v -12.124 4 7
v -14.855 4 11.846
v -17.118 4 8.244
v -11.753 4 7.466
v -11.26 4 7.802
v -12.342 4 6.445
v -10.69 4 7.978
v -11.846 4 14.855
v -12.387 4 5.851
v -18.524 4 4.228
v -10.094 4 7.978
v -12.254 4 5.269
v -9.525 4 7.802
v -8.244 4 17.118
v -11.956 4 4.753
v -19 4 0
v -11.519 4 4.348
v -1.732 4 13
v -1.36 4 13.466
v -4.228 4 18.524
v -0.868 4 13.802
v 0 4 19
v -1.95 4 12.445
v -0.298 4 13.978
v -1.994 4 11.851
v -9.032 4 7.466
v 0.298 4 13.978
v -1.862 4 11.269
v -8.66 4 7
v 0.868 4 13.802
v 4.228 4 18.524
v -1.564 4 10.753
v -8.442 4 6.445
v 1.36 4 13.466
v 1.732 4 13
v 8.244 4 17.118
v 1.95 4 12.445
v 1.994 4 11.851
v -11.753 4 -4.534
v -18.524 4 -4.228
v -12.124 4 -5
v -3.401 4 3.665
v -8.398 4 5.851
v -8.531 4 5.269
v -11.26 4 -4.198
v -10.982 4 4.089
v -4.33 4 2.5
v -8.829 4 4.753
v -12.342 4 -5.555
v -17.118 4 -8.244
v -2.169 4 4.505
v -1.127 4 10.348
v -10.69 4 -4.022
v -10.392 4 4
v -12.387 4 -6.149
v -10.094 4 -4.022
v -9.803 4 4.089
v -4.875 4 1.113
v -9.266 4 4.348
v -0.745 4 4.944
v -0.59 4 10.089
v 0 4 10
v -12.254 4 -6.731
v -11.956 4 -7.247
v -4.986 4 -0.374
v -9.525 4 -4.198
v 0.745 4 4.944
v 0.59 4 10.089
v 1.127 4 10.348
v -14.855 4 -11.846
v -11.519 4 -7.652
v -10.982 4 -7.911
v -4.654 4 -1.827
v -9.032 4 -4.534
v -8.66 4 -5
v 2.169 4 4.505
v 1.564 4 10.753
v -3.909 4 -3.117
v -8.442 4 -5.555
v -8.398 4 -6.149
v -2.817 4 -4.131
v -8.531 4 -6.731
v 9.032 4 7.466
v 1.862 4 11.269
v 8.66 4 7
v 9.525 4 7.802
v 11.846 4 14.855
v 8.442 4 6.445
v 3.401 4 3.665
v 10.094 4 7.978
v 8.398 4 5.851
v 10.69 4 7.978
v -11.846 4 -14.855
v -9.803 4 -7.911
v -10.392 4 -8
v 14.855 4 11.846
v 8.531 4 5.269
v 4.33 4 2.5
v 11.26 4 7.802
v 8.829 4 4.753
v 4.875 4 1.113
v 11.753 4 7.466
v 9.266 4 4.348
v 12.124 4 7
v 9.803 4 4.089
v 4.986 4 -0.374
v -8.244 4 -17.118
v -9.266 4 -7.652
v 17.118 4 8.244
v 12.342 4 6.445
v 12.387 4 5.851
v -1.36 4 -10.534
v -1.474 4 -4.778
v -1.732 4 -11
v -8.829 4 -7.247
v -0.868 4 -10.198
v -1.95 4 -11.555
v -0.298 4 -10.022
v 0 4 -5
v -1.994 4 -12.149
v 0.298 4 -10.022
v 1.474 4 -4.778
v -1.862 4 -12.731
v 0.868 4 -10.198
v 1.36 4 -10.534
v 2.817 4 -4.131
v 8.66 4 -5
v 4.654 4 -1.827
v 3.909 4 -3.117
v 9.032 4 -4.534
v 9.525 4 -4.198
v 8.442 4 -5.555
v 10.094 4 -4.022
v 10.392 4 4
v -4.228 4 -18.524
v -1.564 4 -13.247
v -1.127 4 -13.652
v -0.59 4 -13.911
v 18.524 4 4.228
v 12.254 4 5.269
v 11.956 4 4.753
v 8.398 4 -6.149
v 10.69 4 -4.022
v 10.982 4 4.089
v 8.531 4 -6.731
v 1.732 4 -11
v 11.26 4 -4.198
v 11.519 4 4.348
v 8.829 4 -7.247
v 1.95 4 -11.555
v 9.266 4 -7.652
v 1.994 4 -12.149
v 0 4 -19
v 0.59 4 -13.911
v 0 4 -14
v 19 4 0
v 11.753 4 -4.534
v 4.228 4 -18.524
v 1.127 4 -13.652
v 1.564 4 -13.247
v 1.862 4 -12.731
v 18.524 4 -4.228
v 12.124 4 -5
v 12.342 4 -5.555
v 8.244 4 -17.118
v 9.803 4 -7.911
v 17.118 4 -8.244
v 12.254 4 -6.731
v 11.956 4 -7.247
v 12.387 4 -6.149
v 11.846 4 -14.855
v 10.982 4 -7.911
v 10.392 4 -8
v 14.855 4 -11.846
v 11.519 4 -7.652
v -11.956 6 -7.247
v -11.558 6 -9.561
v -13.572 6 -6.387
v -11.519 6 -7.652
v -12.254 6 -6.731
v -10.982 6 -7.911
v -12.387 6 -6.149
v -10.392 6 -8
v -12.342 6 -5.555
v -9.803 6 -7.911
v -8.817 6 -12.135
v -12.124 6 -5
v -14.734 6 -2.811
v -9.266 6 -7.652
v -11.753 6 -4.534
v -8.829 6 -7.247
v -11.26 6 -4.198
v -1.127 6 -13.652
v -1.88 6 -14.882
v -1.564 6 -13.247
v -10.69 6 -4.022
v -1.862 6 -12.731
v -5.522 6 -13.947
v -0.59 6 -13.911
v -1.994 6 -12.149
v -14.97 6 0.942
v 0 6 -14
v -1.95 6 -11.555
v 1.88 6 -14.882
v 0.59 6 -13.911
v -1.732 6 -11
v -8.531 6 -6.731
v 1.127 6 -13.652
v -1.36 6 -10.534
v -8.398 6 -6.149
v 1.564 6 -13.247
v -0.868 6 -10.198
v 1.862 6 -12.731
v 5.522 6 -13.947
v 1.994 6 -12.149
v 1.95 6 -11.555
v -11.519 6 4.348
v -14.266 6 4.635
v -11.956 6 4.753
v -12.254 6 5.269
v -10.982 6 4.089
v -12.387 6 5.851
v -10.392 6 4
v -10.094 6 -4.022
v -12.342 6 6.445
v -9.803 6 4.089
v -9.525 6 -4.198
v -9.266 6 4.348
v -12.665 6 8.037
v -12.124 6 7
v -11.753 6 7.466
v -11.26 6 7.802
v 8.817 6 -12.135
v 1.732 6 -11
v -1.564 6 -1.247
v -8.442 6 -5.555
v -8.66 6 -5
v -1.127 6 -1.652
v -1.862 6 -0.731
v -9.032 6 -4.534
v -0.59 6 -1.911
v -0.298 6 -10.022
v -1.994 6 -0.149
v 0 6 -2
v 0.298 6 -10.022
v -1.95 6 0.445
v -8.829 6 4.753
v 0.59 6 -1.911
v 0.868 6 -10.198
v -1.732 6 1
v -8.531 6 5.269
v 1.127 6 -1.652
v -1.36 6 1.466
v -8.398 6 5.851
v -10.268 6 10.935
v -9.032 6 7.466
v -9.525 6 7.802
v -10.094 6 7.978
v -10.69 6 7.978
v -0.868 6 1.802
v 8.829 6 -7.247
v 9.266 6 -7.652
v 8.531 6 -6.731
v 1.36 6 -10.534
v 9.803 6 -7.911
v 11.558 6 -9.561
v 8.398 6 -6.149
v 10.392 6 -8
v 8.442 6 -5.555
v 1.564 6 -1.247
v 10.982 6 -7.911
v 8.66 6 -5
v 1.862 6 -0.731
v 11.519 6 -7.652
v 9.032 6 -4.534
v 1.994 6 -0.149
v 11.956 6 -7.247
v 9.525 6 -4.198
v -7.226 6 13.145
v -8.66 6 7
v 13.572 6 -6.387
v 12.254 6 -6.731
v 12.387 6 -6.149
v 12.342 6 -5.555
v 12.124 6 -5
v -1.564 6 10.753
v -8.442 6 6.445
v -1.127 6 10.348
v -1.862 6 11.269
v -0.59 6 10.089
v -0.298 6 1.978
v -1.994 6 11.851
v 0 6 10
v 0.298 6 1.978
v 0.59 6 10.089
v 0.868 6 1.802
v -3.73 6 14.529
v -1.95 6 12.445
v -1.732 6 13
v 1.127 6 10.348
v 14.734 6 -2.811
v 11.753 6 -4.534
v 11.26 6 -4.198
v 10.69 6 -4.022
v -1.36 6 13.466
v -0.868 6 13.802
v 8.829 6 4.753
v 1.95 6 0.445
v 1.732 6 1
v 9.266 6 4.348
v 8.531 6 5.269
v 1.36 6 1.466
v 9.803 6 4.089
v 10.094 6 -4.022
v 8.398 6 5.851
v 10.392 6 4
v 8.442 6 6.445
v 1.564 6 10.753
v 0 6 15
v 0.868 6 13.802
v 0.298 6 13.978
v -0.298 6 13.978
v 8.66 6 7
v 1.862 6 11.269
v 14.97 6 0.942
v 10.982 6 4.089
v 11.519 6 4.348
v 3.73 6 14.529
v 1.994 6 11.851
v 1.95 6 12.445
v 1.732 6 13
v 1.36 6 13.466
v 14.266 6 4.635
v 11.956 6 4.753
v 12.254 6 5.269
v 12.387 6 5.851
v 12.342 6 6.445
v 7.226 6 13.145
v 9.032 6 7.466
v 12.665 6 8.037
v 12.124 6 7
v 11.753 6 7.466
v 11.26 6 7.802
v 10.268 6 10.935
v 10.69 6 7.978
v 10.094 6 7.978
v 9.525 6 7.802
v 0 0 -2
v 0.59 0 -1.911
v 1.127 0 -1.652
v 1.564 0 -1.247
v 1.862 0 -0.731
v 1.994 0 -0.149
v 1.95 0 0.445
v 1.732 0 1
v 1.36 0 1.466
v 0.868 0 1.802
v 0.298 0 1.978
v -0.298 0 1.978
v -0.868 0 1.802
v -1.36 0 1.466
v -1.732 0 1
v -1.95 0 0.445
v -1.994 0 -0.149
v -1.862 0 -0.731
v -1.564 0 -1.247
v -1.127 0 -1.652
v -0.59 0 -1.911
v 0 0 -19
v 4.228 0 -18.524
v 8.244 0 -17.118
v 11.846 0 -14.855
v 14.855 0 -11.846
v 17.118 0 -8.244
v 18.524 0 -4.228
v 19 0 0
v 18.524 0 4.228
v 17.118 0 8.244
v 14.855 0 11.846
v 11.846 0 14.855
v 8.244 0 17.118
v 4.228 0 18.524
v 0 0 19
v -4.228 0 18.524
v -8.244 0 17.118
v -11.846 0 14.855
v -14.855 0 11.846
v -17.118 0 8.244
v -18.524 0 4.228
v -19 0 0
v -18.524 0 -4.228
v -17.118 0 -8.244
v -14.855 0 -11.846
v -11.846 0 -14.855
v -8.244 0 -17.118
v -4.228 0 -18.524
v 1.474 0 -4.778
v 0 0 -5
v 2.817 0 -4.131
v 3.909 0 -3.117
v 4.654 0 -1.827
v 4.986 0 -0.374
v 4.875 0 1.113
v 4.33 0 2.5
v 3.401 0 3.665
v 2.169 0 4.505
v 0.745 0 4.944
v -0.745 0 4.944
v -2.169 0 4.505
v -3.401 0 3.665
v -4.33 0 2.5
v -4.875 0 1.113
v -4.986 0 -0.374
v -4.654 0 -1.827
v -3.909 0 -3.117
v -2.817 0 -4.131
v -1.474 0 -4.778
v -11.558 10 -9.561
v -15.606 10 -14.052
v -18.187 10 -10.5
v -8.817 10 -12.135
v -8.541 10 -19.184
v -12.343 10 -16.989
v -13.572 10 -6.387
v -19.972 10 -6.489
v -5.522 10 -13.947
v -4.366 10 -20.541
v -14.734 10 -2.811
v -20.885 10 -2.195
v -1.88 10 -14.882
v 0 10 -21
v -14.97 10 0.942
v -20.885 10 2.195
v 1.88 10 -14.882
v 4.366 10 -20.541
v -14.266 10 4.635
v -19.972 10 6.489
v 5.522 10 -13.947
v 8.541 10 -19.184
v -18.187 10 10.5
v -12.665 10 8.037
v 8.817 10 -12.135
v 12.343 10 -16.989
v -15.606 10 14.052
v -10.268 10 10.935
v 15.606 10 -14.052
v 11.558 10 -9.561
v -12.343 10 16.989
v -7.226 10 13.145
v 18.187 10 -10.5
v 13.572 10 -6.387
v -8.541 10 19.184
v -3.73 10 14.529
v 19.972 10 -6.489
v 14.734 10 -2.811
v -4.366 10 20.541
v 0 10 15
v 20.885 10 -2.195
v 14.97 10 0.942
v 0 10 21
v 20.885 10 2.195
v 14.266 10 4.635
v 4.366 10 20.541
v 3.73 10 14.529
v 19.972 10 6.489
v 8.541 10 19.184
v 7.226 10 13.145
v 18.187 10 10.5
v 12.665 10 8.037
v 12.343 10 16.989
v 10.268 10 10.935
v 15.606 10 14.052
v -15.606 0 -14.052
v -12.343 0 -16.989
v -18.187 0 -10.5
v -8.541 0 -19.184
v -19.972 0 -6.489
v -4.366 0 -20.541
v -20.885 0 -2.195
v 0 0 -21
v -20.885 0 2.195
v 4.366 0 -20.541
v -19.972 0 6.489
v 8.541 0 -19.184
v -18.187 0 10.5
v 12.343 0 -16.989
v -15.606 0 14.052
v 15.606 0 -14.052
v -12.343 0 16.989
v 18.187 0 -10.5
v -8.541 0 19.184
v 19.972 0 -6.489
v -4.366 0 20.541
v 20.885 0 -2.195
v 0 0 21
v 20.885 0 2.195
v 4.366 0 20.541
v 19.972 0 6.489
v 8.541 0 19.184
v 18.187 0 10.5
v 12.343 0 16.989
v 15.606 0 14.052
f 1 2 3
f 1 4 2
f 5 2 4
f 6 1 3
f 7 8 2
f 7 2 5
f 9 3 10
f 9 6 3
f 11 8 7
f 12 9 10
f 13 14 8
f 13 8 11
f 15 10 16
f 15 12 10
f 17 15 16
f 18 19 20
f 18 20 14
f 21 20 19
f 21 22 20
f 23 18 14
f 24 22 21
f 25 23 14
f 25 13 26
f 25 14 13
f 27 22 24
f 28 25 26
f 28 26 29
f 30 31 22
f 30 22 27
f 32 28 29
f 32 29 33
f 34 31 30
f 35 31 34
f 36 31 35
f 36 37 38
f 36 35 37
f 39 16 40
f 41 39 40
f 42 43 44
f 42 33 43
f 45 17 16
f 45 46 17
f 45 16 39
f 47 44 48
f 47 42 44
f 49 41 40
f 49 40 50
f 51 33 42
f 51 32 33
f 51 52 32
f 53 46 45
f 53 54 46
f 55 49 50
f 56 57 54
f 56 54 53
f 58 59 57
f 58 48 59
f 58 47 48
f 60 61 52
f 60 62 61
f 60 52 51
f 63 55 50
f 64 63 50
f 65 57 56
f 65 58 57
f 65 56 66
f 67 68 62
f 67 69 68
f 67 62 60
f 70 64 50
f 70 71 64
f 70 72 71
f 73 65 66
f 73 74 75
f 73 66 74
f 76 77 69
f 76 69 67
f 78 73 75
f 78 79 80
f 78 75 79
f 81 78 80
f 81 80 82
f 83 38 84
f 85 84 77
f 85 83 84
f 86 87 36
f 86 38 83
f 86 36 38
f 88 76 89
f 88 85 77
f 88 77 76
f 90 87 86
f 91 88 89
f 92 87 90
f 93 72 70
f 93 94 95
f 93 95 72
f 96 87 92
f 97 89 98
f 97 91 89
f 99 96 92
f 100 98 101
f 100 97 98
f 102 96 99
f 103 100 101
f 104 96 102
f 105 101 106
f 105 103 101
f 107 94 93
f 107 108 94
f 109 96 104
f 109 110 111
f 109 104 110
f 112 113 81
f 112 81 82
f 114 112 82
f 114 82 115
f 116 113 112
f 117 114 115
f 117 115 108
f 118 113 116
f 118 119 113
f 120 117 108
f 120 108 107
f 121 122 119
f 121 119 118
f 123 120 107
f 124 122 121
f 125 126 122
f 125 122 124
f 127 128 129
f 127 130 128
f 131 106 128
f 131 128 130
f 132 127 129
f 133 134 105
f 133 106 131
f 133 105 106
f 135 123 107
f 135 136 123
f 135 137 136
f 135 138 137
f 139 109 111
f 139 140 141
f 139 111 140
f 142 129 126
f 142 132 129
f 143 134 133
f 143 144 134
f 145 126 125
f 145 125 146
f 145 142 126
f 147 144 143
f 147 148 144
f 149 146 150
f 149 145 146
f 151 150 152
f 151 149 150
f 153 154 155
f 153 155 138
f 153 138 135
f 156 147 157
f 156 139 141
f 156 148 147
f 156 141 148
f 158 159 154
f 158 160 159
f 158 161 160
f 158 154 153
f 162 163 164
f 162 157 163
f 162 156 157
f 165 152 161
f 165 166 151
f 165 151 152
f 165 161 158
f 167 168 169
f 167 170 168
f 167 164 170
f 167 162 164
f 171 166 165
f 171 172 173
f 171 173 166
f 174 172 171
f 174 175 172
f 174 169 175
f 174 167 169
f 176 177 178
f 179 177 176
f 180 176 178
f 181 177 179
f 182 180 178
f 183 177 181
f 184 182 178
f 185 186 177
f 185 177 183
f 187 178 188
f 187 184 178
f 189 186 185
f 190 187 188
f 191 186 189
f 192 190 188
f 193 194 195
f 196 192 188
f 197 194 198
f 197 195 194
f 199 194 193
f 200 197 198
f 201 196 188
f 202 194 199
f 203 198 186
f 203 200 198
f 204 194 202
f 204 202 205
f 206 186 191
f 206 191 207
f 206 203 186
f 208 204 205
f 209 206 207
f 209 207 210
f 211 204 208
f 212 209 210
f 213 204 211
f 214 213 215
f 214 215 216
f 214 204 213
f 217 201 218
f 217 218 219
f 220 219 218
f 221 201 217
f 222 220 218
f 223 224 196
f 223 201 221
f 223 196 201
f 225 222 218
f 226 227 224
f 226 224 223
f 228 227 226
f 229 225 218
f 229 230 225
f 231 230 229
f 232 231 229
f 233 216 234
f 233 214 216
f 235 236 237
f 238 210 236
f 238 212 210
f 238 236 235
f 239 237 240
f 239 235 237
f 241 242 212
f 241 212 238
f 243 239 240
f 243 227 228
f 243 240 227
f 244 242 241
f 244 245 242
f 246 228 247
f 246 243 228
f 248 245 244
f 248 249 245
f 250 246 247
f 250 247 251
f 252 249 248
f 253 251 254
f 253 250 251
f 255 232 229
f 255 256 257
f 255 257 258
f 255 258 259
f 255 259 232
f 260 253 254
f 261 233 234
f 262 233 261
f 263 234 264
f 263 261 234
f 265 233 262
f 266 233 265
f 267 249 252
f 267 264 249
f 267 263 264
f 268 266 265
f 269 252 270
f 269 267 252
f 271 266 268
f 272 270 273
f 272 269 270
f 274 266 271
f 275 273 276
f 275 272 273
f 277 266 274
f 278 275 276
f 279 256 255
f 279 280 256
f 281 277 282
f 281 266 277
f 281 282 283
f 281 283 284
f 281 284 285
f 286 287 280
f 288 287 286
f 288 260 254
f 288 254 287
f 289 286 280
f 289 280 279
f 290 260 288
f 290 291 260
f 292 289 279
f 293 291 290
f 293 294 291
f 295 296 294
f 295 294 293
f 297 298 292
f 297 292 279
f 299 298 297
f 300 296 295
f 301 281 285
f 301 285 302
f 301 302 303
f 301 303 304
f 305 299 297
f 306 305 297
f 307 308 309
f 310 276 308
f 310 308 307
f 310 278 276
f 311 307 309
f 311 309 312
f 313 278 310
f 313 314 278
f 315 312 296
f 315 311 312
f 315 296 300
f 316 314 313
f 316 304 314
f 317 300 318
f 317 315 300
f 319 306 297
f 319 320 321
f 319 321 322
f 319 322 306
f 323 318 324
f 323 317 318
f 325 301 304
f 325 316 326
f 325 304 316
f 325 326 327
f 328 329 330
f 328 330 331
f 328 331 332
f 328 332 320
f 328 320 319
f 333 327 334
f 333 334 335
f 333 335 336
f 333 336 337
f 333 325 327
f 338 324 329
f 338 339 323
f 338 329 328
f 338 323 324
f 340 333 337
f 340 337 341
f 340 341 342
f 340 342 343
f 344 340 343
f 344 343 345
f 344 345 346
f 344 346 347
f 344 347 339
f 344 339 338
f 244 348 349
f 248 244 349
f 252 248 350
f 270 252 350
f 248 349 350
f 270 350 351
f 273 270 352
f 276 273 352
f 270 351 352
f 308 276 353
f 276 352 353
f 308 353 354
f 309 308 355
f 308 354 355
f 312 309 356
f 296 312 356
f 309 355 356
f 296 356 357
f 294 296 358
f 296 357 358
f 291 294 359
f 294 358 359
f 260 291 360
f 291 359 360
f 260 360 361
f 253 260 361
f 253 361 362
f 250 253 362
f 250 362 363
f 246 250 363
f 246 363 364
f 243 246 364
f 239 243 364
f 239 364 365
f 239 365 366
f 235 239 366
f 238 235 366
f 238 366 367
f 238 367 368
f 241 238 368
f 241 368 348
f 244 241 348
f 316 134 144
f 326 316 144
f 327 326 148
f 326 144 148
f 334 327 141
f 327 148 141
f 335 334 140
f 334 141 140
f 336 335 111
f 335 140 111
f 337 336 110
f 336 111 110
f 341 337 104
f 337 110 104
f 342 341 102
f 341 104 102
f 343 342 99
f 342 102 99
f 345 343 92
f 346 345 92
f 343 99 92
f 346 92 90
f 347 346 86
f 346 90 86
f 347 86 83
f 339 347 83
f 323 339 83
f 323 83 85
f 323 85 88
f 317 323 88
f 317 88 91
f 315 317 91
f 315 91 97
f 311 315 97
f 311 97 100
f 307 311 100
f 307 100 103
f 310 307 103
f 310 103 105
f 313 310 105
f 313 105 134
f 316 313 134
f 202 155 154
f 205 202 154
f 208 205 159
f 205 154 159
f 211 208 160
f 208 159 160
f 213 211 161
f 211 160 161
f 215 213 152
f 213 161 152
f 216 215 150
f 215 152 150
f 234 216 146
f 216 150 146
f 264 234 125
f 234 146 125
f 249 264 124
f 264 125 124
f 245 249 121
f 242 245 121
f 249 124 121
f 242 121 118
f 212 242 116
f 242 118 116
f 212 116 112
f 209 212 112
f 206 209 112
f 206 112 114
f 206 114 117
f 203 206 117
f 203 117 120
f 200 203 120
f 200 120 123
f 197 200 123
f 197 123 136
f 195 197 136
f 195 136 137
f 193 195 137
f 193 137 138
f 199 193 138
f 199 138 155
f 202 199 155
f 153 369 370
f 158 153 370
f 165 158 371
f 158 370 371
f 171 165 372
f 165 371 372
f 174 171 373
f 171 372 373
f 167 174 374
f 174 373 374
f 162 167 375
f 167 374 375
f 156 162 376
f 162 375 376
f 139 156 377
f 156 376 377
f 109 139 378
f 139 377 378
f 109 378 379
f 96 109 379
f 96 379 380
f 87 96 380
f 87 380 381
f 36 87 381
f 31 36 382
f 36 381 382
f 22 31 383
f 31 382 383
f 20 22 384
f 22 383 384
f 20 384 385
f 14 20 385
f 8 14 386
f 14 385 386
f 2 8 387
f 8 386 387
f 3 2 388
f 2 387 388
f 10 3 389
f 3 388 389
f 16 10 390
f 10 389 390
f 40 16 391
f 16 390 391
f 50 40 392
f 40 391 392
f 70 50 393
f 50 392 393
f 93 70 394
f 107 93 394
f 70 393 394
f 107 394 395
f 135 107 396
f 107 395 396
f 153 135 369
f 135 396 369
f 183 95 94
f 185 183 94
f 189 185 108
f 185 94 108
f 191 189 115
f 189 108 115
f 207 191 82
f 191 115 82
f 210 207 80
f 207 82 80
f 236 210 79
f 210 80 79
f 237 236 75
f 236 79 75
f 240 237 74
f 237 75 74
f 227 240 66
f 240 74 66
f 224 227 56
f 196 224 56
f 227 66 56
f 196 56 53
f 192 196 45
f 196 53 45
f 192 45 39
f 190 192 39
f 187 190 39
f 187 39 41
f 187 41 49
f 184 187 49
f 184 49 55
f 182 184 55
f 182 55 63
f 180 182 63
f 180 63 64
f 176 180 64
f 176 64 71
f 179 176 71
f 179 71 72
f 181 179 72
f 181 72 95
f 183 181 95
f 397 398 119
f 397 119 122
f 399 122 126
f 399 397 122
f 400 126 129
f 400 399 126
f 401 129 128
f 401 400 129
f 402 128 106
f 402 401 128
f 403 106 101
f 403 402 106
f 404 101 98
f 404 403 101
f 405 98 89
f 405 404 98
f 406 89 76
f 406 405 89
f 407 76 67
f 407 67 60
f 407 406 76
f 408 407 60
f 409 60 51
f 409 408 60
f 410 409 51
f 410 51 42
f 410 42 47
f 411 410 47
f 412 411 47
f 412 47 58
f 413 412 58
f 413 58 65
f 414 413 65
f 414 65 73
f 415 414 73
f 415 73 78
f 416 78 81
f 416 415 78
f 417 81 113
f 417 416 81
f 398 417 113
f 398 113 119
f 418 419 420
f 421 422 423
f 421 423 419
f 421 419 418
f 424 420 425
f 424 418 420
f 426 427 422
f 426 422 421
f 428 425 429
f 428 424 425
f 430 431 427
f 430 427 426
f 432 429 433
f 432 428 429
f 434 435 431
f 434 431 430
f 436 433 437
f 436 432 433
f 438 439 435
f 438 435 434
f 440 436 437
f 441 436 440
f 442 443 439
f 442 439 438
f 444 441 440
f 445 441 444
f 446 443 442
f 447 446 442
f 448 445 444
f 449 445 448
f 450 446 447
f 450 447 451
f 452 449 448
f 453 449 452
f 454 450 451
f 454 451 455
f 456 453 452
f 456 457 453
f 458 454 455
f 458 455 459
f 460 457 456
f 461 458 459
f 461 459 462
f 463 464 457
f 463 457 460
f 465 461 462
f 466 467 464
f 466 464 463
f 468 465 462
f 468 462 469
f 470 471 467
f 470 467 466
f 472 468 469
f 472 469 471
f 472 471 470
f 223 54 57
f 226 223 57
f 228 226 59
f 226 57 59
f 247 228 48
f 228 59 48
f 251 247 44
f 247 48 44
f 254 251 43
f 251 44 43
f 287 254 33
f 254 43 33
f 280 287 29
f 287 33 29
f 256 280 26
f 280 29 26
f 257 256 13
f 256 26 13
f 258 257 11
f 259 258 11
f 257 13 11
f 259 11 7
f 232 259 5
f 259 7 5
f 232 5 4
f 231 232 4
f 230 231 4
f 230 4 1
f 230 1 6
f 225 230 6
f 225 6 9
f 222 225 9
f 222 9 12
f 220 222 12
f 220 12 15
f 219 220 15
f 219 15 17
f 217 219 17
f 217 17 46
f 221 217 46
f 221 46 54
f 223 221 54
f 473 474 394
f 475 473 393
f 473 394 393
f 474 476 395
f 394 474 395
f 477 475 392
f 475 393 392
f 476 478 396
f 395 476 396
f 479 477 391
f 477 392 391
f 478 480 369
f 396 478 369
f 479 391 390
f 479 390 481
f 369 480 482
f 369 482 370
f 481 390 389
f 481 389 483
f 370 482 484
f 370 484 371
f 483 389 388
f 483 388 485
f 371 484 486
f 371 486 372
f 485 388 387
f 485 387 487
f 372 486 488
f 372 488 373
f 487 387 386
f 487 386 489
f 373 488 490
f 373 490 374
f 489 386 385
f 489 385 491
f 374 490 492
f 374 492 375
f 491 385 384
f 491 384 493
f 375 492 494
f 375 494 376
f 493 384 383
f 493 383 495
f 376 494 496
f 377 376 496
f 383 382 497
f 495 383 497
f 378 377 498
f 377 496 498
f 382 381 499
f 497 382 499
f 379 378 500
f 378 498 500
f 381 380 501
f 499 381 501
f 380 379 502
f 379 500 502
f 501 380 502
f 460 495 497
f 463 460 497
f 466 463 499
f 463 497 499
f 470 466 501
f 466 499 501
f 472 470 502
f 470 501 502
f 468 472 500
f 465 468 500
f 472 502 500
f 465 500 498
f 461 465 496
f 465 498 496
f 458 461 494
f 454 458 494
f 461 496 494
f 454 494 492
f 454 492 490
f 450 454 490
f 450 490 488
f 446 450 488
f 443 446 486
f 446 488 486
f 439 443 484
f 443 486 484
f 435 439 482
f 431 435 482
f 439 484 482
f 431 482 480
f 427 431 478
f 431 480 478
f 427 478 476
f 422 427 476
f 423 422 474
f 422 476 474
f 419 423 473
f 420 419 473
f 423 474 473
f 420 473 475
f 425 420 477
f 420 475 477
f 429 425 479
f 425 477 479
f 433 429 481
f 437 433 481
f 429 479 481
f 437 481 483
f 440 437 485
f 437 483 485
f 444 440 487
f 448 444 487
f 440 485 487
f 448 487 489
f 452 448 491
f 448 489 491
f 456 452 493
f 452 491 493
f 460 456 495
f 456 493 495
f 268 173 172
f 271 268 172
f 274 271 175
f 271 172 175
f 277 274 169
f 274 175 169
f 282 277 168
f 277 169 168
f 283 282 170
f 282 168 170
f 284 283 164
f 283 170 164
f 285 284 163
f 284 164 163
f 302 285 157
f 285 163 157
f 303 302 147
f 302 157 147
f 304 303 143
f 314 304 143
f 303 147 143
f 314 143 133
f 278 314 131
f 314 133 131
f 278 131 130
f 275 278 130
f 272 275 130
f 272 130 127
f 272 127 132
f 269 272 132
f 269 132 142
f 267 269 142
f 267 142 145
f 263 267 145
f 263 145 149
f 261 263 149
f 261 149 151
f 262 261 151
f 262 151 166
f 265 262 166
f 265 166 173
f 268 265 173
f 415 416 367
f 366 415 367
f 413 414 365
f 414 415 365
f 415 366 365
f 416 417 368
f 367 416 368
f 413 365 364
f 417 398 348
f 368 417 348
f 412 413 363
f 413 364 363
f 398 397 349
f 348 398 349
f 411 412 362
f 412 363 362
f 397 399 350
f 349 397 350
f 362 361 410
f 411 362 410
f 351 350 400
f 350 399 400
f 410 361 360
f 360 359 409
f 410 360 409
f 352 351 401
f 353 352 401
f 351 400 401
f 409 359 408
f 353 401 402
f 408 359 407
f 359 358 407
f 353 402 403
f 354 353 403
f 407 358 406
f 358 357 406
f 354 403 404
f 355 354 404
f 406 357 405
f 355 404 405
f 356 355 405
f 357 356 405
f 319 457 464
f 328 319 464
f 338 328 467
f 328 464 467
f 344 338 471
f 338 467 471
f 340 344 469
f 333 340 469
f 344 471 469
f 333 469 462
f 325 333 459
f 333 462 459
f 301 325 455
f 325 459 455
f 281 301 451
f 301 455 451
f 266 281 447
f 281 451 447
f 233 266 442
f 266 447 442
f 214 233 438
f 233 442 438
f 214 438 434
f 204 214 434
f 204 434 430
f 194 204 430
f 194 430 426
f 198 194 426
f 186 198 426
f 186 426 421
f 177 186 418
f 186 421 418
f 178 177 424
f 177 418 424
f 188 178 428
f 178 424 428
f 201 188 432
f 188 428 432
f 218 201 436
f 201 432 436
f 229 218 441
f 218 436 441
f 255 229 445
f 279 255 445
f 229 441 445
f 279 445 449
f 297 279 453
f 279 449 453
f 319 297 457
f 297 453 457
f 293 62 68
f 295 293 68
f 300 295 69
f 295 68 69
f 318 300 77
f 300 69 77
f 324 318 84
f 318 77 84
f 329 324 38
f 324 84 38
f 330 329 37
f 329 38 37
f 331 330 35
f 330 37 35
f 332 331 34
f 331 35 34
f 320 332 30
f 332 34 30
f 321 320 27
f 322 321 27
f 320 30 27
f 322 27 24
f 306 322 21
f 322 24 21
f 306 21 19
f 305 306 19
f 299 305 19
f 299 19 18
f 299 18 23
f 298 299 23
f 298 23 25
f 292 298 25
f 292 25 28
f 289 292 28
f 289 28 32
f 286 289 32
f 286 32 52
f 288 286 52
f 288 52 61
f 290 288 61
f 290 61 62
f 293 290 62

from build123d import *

# Parameters (mm, degrees)
SKETCH1_R           = 21
BOSS_EXTRUDE1_DEPTH = 10
SKETCH2_R           = 15
CUT_EXTRUDE1_DEPTH  = 4
SKETCH3_R           = 19
SKETCH3_R_2         = 5
CUT_EXTRUDE2_DEPTH  = 4
SKETCH4_R           = 2
CUT_EXTRUDE3_DEPTH  = 32.336879232
SKETCH5_R           = 2
CUT_EXTRUDE4_DEPTH  = 31.298514815


with BuildPart() as part:
    # Sketch1 → Boss-Extrude1 (new body)
    with BuildSketch(Plane(origin=(0, 0, 0), x_dir=(1, 0, 0), z_dir=(0, 1, 0))):
        with Locations(Location((0, 0, 0), (0, 0, 270))):
            Circle(SKETCH1_R)
    extrude(amount=BOSS_EXTRUDE1_DEPTH)

    # Sketch2 → Cut-Extrude1 (cut)
    with BuildSketch(Plane(origin=(0, 10, 0), x_dir=(1, 0, 0), z_dir=(0, 1, 0))):
        with Locations(Location((0, 0, 0), (0, 0, 270))):
            Circle(SKETCH2_R)
    extrude(amount=-CUT_EXTRUDE1_DEPTH, mode=Mode.SUBTRACT)

    # Sketch3 → Cut-Extrude2 (cut)
    with BuildSketch(Plane.XZ):
        with Locations(Location((0, 0, 0), (0, 0, 270))):
            Circle(SKETCH3_R)
        with Locations(Location((0, 0, 0), (0, 0, 270))):
            Circle(SKETCH3_R_2, mode=Mode.SUBTRACT)
    extrude(amount=-CUT_EXTRUDE2_DEPTH, mode=Mode.SUBTRACT)

    # Sketch4 → Cut-Extrude3 (cut, through all)
    with BuildSketch(Plane.XZ):
        with Locations(Location((0, 0, 0), (0, 0, 270))):
            Circle(SKETCH4_R)
    extrude(amount=-CUT_EXTRUDE3_DEPTH, mode=Mode.SUBTRACT)

    # Sketch5 → Cut-Extrude4 (cut, through all)
    with BuildSketch(Plane.XZ.offset(-4)):
        with Locations(Location((0, 12, 0), (0, 0, 270))):
            Circle(SKETCH5_R)
        with Locations(Location((10.392304845, 6, 0), (0, 0, 270))):
            Circle(SKETCH5_R)
        with Locations(Location((10.392304845, -6, 0), (0, 0, 270))):
            Circle(SKETCH5_R)
        with Locations(Location((0, -12, 0), (0, 0, 270))):
            Circle(SKETCH5_R)
        with Locations(Location((-10.392304845, -6, 0), (0, 0, 270))):
            Circle(SKETCH5_R)
        with Locations(Location((-10.392304845, 6, 0), (0, 0, 270))):
            Circle(SKETCH5_R)
    extrude(amount=-CUT_EXTRUDE4_DEPTH, mode=Mode.SUBTRACT)


solid = part.part
